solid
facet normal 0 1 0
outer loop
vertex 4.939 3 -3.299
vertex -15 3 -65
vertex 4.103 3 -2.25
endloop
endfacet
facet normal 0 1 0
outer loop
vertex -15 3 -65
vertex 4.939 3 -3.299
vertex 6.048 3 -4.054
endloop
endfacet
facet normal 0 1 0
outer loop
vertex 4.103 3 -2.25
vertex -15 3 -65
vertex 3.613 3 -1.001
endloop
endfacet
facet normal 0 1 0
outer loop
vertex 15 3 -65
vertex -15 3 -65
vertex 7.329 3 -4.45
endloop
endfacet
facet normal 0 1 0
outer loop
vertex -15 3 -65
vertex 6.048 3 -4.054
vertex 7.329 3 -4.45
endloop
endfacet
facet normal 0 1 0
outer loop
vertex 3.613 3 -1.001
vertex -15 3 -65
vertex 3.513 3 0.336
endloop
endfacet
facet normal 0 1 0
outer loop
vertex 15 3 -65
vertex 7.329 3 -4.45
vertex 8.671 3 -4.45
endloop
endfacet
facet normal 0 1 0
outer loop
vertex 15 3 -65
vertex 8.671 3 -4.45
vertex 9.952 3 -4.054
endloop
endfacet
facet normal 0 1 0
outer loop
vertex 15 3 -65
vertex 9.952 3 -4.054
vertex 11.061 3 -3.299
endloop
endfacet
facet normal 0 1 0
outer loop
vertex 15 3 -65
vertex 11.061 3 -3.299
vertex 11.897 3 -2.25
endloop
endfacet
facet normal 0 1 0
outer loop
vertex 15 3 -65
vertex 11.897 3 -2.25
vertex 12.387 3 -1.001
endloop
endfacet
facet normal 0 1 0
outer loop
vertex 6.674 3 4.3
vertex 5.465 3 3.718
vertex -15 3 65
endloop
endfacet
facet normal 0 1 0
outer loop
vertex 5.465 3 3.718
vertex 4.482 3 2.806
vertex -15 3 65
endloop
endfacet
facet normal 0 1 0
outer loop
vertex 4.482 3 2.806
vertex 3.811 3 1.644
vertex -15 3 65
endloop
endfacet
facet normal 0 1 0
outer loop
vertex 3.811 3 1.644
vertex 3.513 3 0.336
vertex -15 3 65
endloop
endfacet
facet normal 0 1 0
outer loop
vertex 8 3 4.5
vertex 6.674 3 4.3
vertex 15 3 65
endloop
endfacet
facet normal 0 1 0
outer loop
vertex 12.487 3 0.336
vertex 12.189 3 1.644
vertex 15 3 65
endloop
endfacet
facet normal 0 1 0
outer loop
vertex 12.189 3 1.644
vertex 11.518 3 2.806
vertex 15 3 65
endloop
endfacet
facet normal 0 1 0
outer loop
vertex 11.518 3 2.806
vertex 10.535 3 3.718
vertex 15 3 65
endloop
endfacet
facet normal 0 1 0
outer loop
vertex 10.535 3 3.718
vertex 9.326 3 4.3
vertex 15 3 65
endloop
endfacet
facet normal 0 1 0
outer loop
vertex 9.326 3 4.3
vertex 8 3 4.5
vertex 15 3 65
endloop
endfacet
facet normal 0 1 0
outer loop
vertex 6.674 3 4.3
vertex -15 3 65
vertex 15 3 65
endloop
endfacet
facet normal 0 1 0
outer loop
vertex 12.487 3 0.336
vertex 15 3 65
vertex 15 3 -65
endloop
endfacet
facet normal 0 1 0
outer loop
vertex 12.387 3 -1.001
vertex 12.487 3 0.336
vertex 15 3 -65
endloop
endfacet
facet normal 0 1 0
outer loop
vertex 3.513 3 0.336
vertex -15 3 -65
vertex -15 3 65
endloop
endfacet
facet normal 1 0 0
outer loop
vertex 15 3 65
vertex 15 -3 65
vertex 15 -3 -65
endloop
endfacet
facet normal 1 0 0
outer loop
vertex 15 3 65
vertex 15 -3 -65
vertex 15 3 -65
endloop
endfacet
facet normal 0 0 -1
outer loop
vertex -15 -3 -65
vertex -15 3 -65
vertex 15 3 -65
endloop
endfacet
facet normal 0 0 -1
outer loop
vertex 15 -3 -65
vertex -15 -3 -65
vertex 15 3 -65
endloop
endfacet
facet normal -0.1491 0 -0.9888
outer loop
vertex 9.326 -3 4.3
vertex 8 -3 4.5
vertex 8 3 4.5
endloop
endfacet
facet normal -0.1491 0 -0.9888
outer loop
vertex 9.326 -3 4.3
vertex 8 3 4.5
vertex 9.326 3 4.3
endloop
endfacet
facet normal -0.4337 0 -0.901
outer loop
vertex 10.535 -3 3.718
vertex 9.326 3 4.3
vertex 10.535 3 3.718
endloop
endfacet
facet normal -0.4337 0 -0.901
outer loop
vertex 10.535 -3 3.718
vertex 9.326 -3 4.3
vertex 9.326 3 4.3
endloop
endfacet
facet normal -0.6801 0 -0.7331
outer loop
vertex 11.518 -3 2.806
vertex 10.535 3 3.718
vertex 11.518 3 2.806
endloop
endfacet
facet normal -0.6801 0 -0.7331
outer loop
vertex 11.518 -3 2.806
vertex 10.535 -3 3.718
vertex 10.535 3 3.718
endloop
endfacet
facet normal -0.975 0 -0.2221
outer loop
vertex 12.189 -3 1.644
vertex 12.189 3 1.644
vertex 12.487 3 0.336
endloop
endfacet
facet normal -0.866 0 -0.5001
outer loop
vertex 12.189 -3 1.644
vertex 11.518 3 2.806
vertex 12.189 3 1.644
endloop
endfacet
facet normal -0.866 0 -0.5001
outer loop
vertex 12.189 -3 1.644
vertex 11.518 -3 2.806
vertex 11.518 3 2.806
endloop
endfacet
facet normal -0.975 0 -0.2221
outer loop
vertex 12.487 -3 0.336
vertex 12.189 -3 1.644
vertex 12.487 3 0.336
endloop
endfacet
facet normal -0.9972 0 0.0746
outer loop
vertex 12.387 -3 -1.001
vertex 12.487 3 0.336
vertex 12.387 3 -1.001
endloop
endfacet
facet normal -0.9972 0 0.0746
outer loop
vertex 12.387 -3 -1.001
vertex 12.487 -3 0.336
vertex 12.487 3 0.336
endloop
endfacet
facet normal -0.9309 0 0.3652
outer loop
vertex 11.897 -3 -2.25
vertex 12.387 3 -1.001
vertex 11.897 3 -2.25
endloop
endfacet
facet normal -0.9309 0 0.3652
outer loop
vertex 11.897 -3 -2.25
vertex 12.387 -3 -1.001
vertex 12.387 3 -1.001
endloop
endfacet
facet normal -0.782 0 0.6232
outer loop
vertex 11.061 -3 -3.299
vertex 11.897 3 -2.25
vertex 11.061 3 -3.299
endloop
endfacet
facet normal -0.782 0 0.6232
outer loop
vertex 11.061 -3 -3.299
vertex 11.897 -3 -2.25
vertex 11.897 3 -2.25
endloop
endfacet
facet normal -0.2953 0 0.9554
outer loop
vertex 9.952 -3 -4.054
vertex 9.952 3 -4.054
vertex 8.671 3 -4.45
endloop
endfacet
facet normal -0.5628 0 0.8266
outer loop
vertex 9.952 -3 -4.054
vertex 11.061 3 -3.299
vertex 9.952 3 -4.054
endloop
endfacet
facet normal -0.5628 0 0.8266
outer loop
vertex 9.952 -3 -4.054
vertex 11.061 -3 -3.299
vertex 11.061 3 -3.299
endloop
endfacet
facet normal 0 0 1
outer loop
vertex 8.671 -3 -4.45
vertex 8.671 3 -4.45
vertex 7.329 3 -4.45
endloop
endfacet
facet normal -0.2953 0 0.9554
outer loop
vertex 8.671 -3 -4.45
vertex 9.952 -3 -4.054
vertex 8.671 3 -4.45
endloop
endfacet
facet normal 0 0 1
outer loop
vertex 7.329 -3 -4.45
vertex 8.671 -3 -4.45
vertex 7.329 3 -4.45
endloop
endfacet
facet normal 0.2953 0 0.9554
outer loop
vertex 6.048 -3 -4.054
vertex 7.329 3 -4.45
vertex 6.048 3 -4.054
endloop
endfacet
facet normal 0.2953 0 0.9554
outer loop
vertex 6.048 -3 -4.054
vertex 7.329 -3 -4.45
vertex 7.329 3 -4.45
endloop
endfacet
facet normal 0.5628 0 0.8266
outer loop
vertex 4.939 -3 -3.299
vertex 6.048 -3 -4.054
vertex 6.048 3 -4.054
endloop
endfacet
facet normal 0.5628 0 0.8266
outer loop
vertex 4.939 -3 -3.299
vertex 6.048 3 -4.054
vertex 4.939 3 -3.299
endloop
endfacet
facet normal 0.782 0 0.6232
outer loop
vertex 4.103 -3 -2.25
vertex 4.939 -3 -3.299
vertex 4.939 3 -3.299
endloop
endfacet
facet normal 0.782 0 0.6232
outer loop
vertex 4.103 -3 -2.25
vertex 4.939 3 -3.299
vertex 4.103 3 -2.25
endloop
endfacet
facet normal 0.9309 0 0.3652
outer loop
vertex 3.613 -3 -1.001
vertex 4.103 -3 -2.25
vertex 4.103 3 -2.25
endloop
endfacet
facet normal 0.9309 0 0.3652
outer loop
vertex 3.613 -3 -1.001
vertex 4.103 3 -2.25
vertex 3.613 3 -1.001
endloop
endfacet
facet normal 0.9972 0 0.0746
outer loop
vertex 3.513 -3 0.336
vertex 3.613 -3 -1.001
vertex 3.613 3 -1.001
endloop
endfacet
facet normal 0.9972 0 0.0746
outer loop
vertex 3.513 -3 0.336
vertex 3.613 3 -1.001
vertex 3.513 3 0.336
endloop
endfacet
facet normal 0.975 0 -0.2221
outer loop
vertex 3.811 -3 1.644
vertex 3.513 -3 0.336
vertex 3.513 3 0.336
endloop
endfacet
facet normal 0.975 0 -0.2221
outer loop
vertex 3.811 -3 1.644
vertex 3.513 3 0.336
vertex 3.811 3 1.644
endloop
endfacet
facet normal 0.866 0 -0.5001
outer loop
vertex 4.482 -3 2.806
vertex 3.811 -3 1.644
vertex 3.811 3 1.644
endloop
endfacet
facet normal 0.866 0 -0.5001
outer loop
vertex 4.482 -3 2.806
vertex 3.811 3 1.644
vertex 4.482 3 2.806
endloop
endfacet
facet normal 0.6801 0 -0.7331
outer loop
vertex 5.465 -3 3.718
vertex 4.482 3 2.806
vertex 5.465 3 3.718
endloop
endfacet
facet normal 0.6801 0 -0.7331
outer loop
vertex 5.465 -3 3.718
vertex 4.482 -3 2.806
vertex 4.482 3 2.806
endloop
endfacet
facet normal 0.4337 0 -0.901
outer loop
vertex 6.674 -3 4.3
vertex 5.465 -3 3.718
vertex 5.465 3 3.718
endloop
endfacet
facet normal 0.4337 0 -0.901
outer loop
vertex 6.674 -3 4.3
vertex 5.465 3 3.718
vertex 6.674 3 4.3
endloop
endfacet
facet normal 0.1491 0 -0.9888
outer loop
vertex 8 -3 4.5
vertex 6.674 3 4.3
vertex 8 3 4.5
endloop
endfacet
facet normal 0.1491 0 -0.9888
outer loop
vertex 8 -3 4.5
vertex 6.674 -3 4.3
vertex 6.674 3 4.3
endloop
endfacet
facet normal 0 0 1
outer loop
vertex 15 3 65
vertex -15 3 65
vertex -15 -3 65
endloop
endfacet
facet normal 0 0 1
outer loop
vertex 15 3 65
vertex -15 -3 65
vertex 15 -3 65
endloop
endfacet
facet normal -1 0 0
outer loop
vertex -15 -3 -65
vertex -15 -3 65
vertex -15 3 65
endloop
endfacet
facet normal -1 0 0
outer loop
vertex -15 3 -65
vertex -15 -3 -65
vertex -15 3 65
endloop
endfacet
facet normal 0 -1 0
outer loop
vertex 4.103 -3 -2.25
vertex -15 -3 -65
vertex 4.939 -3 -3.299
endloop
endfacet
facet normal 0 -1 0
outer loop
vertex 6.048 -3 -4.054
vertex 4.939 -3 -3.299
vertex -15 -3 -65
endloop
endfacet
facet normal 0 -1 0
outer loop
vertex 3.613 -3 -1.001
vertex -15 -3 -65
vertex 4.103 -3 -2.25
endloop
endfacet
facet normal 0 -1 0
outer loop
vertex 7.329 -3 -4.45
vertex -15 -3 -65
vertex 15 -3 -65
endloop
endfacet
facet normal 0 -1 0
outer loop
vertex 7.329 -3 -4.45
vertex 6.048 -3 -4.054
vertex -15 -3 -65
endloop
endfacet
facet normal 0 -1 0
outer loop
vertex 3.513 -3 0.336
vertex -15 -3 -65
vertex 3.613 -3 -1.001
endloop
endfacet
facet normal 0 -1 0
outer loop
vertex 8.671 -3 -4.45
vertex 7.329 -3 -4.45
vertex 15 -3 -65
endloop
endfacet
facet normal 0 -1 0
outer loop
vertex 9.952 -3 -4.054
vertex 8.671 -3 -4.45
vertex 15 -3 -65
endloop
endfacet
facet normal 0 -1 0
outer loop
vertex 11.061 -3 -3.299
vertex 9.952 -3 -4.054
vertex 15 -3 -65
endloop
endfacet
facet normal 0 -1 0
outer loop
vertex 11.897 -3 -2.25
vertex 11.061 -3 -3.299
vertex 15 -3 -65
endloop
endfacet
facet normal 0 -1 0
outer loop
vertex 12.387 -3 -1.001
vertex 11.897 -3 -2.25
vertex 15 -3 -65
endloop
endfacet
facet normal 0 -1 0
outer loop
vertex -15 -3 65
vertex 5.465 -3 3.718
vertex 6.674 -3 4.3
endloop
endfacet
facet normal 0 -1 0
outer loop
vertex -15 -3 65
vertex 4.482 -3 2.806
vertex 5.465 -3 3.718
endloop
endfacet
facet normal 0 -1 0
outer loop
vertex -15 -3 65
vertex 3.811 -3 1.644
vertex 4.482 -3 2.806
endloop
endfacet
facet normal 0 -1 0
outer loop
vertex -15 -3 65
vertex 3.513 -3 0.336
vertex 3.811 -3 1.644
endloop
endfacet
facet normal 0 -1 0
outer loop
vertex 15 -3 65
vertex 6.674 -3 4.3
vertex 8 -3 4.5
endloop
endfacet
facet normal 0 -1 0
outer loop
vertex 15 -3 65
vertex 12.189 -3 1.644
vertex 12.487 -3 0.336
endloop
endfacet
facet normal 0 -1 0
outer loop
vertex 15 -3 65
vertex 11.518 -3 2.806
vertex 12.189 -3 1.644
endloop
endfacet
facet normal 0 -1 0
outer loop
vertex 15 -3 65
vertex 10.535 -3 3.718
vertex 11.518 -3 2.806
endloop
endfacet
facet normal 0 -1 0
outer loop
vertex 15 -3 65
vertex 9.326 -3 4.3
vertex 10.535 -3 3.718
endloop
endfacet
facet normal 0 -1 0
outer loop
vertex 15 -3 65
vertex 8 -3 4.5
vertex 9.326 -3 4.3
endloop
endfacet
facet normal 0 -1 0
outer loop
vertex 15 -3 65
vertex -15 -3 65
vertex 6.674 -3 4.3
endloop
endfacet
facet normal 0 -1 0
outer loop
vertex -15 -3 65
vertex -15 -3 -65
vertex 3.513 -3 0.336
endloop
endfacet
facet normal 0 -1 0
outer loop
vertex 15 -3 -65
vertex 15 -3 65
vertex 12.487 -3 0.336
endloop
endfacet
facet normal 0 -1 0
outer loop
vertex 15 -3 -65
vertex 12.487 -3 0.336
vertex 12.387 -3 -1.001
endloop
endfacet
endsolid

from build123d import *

# Parameters (mm, degrees)
SKIZZE1_W                       = 30
SKIZZE1_H                       = 6
AUFSATZ_LINEAR_AUSTRAGEN1_DEPTH = 65
CUT_EXTRUDE1_DEPTH              = 67.775744099
CUT_EXTRUDE1_DEPTH_BACK         = 67.775744099
SKETCH1_R                       = 4.5


with BuildPart() as part:
    # Skizze1 → Aufsatz-Linear austragen1 (new, symmetric)
    with BuildSketch(Plane.XY):
        Rectangle(SKIZZE1_W, SKIZZE1_H)
    extrude(amount=AUFSATZ_LINEAR_AUSTRAGEN1_DEPTH, both=True)

    # Sketch1 → Cut-Extrude1 (cut, two sides: drawn at the far end of the back side and taken through both)
    with BuildSketch(Plane(origin=(0, 0, 0), x_dir=(1, 0, 0), z_dir=(0, 1, 0)).offset(-CUT_EXTRUDE1_DEPTH_BACK)):
        with Locations(Location((8, 0, 0), (0, 0, 270))):
            Circle(SKETCH1_R)
    extrude(amount=CUT_EXTRUDE1_DEPTH + CUT_EXTRUDE1_DEPTH_BACK, mode=Mode.SUBTRACT)


solid = part.part
